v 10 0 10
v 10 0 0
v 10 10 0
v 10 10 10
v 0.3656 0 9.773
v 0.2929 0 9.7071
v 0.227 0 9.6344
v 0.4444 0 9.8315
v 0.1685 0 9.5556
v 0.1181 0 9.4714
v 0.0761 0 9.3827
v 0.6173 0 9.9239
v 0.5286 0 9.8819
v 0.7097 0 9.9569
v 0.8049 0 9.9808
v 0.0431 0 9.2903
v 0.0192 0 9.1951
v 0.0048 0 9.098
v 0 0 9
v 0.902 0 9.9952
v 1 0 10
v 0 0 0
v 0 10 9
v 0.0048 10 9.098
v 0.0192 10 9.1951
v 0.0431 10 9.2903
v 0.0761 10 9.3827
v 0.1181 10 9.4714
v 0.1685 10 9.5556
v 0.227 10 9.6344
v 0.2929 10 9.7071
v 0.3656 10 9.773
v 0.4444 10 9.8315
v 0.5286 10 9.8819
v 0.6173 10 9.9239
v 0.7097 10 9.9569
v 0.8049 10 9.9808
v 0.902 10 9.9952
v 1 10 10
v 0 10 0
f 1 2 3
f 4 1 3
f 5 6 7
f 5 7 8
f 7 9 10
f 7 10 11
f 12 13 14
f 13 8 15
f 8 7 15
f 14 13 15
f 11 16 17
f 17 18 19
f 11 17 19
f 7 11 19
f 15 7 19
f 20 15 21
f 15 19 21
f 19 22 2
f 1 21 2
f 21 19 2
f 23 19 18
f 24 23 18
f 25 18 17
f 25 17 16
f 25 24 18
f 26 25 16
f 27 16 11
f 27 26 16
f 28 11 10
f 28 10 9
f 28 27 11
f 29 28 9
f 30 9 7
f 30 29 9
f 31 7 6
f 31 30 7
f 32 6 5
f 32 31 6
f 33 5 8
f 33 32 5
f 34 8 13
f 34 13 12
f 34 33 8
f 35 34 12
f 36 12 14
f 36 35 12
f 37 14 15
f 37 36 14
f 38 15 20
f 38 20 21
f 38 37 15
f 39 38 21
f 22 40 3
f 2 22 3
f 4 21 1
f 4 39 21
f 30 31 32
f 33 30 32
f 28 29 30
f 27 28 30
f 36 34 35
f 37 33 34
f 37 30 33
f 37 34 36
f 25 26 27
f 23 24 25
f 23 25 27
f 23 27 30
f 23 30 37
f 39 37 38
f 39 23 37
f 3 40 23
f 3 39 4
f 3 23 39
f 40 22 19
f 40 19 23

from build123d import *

# Parameters (mm, degrees)
BOX_W     = 10
BOX_H     = 10
BOX_DEPTH = 10
FILLET_R  = 1


with BuildPart() as part:
    # Box → Box (new body)
    with BuildSketch(Plane.XY):
        with Locations((5, 5)):
            Rectangle(BOX_W, BOX_H)
    extrude(amount=BOX_DEPTH)

    # Fillet
    fillet_edges = [part.edges().sort_by_distance(p)[0] for p in [
        (0, 5, 10),
    ]]
    fillet(fillet_edges, radius=FILLET_R)


solid = part.part
